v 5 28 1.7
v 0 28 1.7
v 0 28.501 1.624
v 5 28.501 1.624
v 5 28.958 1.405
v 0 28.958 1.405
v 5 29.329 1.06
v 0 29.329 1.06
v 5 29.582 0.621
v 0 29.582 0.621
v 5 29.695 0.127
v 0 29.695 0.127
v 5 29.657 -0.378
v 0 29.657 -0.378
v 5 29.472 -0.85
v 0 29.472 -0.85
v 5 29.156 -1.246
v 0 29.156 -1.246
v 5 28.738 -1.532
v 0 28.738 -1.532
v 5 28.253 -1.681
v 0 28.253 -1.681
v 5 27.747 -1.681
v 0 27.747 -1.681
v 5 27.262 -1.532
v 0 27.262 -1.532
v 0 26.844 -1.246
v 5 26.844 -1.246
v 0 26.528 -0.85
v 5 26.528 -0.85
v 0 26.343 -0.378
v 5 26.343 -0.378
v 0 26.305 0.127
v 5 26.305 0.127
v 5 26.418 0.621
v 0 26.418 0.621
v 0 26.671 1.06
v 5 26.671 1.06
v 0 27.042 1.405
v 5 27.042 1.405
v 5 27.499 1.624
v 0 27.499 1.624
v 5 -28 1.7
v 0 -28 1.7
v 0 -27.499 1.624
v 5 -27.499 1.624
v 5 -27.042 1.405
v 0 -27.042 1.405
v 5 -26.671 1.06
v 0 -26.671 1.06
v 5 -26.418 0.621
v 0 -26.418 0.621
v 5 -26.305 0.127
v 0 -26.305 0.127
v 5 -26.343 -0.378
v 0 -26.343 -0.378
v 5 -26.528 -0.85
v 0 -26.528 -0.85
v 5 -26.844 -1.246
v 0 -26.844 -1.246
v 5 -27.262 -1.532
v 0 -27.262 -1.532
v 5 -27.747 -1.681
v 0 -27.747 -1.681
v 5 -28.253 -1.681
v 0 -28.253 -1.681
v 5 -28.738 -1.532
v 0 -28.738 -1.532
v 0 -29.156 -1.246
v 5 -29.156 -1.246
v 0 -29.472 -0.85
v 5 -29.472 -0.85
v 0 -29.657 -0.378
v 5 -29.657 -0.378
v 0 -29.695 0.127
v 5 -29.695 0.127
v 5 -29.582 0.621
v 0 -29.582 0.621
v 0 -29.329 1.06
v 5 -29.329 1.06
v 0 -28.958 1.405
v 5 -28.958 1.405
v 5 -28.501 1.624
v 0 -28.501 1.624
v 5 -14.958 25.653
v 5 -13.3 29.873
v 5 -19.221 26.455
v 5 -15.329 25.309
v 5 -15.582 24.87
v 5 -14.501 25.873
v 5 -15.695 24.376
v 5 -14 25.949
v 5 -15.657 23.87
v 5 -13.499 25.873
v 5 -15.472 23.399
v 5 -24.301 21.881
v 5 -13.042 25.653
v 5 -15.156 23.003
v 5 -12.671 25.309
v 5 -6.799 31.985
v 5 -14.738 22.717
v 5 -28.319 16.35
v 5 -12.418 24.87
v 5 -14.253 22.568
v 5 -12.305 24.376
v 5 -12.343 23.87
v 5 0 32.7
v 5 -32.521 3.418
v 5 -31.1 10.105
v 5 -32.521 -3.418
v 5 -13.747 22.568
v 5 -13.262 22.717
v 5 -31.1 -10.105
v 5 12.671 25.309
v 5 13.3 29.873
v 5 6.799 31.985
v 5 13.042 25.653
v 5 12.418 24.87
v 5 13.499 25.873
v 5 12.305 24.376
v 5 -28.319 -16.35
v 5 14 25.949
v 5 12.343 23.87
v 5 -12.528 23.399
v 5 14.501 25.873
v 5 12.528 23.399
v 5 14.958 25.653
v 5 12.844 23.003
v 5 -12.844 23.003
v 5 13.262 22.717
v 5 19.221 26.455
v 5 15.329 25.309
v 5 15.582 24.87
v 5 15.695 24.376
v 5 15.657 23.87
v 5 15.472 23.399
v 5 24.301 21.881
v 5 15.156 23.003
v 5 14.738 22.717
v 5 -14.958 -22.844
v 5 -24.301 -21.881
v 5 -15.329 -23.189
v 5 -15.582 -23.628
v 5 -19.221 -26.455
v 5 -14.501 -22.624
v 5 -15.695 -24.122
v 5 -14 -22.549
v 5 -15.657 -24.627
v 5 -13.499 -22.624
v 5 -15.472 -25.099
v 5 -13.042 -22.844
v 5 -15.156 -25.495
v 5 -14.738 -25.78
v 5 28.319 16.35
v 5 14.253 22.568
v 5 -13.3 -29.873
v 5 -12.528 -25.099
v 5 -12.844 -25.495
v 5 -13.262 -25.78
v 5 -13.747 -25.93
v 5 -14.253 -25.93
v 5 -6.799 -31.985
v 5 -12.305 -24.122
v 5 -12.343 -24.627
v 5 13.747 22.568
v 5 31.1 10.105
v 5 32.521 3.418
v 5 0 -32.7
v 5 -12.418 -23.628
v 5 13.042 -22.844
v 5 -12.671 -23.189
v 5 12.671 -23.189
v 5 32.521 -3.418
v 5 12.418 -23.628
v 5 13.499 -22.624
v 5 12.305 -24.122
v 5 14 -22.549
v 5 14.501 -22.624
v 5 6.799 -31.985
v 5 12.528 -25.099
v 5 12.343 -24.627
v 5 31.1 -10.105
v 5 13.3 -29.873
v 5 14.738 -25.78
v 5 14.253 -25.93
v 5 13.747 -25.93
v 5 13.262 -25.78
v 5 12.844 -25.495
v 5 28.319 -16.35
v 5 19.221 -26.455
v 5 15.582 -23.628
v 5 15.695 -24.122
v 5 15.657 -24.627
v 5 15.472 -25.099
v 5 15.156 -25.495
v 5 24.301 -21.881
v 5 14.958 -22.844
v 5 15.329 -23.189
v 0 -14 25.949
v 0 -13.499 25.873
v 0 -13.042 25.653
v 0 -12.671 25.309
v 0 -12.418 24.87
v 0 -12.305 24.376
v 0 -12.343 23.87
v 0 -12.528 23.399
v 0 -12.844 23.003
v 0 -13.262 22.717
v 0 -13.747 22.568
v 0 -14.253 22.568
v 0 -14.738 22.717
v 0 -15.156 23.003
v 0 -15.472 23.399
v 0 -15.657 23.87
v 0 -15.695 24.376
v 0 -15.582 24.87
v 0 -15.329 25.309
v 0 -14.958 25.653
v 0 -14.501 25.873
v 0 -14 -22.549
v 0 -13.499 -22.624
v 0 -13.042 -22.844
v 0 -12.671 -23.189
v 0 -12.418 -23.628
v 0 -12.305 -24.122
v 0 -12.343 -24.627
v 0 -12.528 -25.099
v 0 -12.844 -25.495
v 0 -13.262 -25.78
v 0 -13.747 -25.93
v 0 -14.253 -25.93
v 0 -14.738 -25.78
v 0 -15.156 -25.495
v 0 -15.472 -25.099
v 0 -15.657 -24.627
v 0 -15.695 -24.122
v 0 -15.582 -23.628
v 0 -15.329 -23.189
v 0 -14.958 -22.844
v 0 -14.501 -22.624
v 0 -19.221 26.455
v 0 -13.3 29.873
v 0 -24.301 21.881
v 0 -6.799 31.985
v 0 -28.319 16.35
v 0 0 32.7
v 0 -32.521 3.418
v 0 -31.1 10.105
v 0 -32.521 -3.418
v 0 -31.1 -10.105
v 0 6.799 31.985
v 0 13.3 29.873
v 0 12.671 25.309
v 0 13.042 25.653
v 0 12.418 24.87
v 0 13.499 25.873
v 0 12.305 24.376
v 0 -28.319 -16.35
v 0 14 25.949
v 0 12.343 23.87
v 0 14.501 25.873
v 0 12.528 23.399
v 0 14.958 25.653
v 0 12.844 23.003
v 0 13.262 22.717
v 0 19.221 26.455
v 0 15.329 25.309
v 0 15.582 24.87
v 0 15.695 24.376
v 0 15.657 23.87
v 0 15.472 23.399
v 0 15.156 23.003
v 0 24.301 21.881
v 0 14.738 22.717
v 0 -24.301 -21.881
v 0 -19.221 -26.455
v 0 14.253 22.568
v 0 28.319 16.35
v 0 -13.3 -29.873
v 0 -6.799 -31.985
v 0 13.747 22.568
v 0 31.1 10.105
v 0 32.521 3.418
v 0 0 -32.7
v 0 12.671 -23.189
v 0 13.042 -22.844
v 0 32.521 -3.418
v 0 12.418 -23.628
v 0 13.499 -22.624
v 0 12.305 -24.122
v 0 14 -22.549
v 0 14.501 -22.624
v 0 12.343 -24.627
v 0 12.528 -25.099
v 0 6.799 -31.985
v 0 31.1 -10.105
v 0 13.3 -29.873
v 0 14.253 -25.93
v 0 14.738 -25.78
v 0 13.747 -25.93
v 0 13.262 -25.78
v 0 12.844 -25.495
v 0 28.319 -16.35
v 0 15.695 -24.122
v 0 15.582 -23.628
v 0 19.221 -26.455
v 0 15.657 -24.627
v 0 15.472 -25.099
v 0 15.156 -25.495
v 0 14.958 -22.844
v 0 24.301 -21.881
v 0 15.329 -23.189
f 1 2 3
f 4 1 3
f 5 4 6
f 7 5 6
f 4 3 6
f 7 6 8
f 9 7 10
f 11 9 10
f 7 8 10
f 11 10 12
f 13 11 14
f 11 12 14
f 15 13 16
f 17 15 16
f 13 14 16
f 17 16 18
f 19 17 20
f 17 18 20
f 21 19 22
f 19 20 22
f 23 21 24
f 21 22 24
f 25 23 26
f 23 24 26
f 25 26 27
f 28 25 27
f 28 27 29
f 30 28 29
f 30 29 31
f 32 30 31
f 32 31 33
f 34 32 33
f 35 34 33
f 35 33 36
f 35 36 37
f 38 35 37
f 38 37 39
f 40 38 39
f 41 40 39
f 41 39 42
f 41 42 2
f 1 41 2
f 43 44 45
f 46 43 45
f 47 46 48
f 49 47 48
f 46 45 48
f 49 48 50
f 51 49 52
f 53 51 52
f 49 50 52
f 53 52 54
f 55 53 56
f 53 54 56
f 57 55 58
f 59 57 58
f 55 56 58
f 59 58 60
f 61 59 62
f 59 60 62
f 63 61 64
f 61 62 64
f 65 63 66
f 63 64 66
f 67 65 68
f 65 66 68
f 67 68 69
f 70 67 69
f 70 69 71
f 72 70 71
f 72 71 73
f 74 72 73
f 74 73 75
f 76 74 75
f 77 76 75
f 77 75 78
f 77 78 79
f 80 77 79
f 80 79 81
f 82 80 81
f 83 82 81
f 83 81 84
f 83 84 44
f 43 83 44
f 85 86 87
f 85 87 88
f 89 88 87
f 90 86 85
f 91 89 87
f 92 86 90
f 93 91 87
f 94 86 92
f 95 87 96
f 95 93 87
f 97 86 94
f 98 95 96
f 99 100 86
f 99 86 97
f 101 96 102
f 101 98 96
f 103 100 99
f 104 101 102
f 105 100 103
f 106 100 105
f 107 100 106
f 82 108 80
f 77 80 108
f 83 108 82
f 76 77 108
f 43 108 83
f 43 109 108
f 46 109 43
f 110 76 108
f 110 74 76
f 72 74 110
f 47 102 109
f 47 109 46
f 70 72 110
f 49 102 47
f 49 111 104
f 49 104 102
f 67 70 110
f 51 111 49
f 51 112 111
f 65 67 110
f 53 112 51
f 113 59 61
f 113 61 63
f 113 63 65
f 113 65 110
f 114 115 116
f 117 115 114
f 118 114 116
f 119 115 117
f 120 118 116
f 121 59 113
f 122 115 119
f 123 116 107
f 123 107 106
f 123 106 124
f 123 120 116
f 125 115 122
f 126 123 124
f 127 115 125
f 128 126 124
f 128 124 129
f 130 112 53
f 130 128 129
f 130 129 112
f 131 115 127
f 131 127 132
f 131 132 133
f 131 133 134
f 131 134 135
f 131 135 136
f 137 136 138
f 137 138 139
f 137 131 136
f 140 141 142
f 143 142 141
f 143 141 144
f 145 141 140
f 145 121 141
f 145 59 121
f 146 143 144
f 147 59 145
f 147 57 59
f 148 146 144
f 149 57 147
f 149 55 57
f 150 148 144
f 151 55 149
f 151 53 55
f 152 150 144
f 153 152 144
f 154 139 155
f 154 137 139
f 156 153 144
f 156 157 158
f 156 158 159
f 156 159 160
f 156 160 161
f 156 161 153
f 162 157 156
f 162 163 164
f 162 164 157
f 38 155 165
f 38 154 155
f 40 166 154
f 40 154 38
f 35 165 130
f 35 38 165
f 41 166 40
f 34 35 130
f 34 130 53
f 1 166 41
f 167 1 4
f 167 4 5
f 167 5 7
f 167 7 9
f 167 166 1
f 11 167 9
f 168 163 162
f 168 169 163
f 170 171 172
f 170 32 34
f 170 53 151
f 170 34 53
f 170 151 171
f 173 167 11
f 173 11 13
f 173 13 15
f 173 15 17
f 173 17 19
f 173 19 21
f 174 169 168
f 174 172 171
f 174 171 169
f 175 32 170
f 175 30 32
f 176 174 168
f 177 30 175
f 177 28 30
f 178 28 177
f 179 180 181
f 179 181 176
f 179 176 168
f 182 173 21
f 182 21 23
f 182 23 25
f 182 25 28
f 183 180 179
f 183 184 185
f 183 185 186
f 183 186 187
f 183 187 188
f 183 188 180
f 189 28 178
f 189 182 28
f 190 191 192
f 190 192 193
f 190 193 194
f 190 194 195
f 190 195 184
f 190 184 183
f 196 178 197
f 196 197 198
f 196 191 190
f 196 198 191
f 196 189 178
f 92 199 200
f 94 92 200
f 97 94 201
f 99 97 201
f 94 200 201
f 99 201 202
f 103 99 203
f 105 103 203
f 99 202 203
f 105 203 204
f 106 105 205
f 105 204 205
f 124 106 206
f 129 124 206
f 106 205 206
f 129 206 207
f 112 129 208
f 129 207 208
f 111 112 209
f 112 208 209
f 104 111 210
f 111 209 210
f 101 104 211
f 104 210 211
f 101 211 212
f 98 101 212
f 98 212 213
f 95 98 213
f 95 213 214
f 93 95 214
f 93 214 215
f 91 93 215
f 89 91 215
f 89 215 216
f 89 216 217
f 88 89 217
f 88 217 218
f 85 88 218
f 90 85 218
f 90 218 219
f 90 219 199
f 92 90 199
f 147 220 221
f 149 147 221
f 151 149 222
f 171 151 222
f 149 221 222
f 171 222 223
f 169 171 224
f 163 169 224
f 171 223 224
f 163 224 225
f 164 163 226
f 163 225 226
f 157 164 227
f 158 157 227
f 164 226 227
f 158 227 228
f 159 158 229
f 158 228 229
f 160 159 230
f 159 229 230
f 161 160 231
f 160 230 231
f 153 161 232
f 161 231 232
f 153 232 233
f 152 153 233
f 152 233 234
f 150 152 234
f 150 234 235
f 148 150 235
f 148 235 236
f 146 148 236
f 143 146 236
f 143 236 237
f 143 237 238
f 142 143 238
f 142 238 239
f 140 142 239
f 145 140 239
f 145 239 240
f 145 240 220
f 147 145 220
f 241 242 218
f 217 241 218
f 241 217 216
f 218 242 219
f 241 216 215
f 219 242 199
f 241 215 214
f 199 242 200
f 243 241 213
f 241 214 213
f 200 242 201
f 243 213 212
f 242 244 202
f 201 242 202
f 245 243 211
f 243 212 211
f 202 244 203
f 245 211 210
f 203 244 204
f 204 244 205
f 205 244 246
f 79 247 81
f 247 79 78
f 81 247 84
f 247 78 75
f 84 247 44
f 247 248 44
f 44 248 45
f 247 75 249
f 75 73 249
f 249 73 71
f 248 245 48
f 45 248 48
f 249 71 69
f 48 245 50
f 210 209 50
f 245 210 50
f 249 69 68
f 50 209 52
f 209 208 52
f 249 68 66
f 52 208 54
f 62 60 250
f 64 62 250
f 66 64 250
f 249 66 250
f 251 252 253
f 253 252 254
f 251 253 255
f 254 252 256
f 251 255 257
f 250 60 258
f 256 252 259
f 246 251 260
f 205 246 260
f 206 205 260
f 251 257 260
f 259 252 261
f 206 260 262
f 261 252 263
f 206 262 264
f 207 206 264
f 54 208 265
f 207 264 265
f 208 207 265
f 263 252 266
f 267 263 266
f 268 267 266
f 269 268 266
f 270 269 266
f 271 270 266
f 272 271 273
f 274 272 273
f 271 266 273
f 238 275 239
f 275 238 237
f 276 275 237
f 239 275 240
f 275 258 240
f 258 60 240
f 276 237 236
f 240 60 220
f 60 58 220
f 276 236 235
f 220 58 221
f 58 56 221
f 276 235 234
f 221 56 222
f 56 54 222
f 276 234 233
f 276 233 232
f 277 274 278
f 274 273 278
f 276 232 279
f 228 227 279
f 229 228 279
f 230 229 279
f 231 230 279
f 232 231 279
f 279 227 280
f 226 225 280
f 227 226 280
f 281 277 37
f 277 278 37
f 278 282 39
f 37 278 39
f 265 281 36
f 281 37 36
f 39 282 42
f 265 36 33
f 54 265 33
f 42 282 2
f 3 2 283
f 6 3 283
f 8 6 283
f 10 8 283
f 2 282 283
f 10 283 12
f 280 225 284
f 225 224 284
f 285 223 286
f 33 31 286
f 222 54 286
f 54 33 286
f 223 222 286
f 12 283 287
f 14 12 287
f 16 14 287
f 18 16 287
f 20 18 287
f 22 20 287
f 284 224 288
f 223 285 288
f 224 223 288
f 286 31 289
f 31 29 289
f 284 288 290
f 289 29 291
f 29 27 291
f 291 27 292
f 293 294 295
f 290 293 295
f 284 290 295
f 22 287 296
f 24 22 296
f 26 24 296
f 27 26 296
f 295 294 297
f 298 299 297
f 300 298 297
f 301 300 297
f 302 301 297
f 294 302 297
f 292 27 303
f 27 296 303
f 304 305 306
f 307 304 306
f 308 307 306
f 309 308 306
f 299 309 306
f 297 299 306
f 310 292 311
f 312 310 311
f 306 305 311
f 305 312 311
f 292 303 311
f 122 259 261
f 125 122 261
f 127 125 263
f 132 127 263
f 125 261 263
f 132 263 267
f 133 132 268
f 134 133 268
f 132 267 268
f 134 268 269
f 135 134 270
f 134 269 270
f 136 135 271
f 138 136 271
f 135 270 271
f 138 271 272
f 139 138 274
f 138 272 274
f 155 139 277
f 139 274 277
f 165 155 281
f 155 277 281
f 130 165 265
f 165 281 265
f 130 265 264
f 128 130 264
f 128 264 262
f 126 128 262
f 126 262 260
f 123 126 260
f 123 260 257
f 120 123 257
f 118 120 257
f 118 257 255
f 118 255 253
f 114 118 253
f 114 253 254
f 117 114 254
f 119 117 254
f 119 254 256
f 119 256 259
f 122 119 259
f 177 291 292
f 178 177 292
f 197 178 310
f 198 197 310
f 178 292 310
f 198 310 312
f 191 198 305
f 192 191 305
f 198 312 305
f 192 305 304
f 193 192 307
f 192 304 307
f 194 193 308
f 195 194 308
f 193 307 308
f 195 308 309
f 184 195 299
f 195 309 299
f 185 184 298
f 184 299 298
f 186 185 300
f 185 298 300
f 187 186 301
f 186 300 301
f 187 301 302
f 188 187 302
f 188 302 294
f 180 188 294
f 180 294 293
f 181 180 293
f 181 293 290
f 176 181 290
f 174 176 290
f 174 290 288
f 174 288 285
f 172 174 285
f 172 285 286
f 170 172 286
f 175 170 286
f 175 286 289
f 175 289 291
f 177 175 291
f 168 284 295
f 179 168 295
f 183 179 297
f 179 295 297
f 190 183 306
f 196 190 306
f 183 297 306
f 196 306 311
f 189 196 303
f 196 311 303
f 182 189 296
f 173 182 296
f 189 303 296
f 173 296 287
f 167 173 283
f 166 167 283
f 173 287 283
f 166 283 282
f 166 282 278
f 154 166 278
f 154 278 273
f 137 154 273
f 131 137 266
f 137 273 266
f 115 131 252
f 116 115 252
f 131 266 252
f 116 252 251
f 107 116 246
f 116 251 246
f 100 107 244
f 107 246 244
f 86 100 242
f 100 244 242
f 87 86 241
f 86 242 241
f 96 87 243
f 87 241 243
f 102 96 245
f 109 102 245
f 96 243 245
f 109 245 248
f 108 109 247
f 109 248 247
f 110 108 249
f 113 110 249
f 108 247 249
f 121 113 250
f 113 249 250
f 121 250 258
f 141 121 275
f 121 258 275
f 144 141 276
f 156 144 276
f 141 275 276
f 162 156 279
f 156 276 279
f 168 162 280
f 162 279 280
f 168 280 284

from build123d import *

# Parameters (mm, degrees)
CROQUIS1_R                       = 32.7
SALIENTE_EXTRUIR1_DEPTH          = 5
TALADRO_DE_MARGEN_PARA_M31_D     = 3.4
TALADRO_DE_MARGEN_PARA_M31_DEPTH = 10
TALADRO_DE_MARGEN_PARA_M31_TIP   = 1.021463052


with BuildPart() as part:
    # Croquis1 → Saliente-Extruir1 (new body)
    with BuildSketch(Plane(origin=(0, 0, 0), x_dir=(0, 0, -1), z_dir=(1, 0, 0))):
        Circle(CROQUIS1_R)
    extrude(amount=SALIENTE_EXTRUIR1_DEPTH)

    # Taladro de margen para M31
    with Locations(Plane(origin=(5, 0, 0), x_dir=(0, 0, -1), z_dir=(1, 0, 0))):
        with Locations((0, 28), (24.248711306, 14), (24.248711306, -14), (0, -28), (-24.248711306, -14), (-24.248711306, 14)):
            Hole(TALADRO_DE_MARGEN_PARA_M31_D / 2, depth=TALADRO_DE_MARGEN_PARA_M31_DEPTH)
            with Locations((0, 0, -(TALADRO_DE_MARGEN_PARA_M31_DEPTH + TALADRO_DE_MARGEN_PARA_M31_TIP / 2))):  # 118° drill point
                Cone(0, TALADRO_DE_MARGEN_PARA_M31_D / 2, TALADRO_DE_MARGEN_PARA_M31_TIP, mode=Mode.SUBTRACT)


solid = part.part
